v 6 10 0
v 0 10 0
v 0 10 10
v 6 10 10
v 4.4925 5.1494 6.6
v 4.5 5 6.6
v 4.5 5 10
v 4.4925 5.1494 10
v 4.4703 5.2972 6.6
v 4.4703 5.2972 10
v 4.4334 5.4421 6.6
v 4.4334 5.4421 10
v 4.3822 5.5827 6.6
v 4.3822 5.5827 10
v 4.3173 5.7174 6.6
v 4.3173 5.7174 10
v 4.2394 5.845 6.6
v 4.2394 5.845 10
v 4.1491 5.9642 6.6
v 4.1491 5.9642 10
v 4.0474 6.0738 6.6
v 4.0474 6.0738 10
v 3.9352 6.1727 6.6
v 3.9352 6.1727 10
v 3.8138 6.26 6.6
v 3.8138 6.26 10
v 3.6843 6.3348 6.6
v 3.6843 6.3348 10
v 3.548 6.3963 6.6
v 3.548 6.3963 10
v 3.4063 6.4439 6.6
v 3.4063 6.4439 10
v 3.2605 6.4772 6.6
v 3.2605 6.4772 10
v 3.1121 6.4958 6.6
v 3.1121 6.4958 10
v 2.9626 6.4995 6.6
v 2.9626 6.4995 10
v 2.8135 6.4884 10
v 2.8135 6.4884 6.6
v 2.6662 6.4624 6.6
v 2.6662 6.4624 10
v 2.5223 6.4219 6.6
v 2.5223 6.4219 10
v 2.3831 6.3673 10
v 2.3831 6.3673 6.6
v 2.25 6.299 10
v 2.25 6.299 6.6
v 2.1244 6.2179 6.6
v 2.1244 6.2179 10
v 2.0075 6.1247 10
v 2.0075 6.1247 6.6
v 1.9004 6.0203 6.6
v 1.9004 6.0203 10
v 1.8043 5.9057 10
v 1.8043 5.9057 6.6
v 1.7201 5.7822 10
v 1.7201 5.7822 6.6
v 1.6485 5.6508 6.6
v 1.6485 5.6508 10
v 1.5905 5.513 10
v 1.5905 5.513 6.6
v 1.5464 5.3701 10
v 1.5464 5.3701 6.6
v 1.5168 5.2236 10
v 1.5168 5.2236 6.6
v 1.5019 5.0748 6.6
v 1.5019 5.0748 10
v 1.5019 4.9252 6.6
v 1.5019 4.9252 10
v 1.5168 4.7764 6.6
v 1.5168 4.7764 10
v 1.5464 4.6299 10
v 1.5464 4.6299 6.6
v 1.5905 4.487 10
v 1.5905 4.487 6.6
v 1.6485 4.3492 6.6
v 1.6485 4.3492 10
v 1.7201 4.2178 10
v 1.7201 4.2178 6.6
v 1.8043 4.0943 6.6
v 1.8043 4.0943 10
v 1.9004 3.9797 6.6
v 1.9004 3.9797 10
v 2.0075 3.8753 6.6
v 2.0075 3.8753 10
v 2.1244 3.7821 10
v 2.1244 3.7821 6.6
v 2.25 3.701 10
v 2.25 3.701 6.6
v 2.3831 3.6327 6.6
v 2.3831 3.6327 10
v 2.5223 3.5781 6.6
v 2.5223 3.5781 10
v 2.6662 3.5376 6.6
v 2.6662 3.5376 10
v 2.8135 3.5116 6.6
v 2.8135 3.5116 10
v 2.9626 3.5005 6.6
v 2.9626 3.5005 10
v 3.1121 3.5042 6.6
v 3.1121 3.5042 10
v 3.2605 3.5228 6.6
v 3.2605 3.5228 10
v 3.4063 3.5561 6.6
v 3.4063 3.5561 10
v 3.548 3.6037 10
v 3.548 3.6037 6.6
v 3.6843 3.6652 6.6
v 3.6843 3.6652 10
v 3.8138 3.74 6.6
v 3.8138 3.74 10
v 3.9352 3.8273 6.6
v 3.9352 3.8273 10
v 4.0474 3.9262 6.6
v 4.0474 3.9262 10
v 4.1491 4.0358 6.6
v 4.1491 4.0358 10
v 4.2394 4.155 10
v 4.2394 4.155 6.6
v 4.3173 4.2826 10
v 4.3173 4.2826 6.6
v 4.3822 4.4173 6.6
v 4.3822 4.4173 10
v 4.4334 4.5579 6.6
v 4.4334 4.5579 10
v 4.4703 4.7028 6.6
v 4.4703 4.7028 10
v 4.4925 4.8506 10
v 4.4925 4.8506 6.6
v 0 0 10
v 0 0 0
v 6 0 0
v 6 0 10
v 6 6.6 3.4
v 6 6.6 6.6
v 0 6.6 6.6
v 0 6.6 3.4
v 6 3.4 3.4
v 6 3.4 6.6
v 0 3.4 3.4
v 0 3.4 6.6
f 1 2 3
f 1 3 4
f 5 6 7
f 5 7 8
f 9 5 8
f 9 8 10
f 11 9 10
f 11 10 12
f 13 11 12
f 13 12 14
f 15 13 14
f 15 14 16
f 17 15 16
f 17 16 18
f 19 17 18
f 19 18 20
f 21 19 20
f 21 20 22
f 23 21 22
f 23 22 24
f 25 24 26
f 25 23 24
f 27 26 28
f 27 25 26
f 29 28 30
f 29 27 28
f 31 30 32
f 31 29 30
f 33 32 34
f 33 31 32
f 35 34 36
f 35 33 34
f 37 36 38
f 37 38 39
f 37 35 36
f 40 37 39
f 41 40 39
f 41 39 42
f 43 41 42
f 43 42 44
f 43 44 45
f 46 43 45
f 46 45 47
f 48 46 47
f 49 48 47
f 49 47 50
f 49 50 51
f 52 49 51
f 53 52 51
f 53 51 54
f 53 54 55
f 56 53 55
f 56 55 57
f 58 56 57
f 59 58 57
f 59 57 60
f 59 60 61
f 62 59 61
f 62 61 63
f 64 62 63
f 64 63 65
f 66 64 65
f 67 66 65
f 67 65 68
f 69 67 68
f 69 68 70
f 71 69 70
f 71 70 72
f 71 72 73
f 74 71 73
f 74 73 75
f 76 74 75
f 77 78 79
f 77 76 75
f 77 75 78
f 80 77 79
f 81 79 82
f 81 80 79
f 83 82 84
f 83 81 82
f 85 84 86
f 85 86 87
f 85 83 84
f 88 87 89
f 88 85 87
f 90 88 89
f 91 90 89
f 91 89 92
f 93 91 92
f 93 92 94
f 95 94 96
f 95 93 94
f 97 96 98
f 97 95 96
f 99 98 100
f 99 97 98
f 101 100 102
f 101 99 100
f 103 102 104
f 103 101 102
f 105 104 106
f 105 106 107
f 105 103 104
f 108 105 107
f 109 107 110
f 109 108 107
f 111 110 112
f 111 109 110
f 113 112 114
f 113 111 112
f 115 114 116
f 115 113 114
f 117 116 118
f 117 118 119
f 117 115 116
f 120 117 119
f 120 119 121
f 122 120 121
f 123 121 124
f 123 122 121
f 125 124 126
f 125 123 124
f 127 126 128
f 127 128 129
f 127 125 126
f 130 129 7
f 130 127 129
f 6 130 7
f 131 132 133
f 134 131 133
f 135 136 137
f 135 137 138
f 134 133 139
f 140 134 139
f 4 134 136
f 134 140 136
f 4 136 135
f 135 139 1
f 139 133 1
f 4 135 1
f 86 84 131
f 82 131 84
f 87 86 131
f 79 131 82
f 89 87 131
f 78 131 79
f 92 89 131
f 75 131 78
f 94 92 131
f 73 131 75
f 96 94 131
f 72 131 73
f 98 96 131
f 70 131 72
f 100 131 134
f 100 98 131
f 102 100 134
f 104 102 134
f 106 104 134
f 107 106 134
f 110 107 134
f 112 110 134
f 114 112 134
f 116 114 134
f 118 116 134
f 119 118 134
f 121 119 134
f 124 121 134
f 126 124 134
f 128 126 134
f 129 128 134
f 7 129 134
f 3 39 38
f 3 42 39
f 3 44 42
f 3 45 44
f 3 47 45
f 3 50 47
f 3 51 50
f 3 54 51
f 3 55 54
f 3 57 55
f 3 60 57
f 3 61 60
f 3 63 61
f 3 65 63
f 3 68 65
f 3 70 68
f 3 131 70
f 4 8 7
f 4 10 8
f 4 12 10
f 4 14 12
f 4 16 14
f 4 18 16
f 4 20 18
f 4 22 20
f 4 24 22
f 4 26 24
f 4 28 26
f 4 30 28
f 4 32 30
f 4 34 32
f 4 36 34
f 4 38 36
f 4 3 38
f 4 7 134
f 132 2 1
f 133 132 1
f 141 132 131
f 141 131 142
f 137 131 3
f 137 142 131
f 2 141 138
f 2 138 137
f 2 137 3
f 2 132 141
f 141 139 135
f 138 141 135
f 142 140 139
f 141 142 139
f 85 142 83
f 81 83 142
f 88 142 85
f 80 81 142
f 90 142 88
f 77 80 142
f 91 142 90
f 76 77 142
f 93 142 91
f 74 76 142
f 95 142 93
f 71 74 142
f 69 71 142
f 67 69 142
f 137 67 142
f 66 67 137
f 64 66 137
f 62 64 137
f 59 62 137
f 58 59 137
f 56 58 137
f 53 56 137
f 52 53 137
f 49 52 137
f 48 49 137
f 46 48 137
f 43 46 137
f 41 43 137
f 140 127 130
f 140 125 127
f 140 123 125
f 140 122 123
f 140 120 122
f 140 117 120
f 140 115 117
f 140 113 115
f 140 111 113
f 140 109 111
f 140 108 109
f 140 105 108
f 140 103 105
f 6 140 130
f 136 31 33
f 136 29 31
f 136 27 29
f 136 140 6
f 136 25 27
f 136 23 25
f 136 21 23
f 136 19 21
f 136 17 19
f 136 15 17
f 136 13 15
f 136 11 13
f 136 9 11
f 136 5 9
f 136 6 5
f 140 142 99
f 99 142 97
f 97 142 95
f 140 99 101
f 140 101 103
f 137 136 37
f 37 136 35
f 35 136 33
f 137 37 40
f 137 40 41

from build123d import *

# Parameters (mm, degrees)
SKETCH1_W           = 6
SKETCH1_H           = 10
SKETCH1_R           = 1.5
BOSS_EXTRUDE1_DEPTH = 10
SKETCH2_W           = 3.2
SKETCH2_H           = 3.2
CUT_EXTRUDE1_DEPTH  = 16.362291496
SKETCH1_3_R         = 1.5
BOSS_EXTRUDE2_DEPTH = 3.4


with BuildPart() as part:
    # Sketch1 → Boss-Extrude1 (new body)
    with BuildSketch(Plane.XY):
        with Locations((3, 5)):
            Rectangle(SKETCH1_W, SKETCH1_H)
        with Locations((3, 5)):
            Circle(SKETCH1_R, mode=Mode.SUBTRACT)
    extrude(amount=BOSS_EXTRUDE1_DEPTH)

    # Sketch2 → Cut-Extrude1 (cut, through all)
    with BuildSketch(Plane(origin=(6, 0, 0), x_dir=(0, 0, -1), z_dir=(1, 0, 0))):
        with Locations((-5, 5)):
            Rectangle(SKETCH2_W, SKETCH2_H)
    extrude(amount=-CUT_EXTRUDE1_DEPTH, mode=Mode.SUBTRACT)

    # Sketch1<3> → Boss-Extrude2 (add)
    with BuildSketch(Plane.XY):
        with Locations((3, 5)):
            Circle(SKETCH1_3_R)
        Polygon((0, 10), (6, 0), (0, 0), align=None)
        Polygon((0, 10), (6, 10), (6, 0), align=None)
    extrude(amount=BOSS_EXTRUDE2_DEPTH)


solid = part.part
